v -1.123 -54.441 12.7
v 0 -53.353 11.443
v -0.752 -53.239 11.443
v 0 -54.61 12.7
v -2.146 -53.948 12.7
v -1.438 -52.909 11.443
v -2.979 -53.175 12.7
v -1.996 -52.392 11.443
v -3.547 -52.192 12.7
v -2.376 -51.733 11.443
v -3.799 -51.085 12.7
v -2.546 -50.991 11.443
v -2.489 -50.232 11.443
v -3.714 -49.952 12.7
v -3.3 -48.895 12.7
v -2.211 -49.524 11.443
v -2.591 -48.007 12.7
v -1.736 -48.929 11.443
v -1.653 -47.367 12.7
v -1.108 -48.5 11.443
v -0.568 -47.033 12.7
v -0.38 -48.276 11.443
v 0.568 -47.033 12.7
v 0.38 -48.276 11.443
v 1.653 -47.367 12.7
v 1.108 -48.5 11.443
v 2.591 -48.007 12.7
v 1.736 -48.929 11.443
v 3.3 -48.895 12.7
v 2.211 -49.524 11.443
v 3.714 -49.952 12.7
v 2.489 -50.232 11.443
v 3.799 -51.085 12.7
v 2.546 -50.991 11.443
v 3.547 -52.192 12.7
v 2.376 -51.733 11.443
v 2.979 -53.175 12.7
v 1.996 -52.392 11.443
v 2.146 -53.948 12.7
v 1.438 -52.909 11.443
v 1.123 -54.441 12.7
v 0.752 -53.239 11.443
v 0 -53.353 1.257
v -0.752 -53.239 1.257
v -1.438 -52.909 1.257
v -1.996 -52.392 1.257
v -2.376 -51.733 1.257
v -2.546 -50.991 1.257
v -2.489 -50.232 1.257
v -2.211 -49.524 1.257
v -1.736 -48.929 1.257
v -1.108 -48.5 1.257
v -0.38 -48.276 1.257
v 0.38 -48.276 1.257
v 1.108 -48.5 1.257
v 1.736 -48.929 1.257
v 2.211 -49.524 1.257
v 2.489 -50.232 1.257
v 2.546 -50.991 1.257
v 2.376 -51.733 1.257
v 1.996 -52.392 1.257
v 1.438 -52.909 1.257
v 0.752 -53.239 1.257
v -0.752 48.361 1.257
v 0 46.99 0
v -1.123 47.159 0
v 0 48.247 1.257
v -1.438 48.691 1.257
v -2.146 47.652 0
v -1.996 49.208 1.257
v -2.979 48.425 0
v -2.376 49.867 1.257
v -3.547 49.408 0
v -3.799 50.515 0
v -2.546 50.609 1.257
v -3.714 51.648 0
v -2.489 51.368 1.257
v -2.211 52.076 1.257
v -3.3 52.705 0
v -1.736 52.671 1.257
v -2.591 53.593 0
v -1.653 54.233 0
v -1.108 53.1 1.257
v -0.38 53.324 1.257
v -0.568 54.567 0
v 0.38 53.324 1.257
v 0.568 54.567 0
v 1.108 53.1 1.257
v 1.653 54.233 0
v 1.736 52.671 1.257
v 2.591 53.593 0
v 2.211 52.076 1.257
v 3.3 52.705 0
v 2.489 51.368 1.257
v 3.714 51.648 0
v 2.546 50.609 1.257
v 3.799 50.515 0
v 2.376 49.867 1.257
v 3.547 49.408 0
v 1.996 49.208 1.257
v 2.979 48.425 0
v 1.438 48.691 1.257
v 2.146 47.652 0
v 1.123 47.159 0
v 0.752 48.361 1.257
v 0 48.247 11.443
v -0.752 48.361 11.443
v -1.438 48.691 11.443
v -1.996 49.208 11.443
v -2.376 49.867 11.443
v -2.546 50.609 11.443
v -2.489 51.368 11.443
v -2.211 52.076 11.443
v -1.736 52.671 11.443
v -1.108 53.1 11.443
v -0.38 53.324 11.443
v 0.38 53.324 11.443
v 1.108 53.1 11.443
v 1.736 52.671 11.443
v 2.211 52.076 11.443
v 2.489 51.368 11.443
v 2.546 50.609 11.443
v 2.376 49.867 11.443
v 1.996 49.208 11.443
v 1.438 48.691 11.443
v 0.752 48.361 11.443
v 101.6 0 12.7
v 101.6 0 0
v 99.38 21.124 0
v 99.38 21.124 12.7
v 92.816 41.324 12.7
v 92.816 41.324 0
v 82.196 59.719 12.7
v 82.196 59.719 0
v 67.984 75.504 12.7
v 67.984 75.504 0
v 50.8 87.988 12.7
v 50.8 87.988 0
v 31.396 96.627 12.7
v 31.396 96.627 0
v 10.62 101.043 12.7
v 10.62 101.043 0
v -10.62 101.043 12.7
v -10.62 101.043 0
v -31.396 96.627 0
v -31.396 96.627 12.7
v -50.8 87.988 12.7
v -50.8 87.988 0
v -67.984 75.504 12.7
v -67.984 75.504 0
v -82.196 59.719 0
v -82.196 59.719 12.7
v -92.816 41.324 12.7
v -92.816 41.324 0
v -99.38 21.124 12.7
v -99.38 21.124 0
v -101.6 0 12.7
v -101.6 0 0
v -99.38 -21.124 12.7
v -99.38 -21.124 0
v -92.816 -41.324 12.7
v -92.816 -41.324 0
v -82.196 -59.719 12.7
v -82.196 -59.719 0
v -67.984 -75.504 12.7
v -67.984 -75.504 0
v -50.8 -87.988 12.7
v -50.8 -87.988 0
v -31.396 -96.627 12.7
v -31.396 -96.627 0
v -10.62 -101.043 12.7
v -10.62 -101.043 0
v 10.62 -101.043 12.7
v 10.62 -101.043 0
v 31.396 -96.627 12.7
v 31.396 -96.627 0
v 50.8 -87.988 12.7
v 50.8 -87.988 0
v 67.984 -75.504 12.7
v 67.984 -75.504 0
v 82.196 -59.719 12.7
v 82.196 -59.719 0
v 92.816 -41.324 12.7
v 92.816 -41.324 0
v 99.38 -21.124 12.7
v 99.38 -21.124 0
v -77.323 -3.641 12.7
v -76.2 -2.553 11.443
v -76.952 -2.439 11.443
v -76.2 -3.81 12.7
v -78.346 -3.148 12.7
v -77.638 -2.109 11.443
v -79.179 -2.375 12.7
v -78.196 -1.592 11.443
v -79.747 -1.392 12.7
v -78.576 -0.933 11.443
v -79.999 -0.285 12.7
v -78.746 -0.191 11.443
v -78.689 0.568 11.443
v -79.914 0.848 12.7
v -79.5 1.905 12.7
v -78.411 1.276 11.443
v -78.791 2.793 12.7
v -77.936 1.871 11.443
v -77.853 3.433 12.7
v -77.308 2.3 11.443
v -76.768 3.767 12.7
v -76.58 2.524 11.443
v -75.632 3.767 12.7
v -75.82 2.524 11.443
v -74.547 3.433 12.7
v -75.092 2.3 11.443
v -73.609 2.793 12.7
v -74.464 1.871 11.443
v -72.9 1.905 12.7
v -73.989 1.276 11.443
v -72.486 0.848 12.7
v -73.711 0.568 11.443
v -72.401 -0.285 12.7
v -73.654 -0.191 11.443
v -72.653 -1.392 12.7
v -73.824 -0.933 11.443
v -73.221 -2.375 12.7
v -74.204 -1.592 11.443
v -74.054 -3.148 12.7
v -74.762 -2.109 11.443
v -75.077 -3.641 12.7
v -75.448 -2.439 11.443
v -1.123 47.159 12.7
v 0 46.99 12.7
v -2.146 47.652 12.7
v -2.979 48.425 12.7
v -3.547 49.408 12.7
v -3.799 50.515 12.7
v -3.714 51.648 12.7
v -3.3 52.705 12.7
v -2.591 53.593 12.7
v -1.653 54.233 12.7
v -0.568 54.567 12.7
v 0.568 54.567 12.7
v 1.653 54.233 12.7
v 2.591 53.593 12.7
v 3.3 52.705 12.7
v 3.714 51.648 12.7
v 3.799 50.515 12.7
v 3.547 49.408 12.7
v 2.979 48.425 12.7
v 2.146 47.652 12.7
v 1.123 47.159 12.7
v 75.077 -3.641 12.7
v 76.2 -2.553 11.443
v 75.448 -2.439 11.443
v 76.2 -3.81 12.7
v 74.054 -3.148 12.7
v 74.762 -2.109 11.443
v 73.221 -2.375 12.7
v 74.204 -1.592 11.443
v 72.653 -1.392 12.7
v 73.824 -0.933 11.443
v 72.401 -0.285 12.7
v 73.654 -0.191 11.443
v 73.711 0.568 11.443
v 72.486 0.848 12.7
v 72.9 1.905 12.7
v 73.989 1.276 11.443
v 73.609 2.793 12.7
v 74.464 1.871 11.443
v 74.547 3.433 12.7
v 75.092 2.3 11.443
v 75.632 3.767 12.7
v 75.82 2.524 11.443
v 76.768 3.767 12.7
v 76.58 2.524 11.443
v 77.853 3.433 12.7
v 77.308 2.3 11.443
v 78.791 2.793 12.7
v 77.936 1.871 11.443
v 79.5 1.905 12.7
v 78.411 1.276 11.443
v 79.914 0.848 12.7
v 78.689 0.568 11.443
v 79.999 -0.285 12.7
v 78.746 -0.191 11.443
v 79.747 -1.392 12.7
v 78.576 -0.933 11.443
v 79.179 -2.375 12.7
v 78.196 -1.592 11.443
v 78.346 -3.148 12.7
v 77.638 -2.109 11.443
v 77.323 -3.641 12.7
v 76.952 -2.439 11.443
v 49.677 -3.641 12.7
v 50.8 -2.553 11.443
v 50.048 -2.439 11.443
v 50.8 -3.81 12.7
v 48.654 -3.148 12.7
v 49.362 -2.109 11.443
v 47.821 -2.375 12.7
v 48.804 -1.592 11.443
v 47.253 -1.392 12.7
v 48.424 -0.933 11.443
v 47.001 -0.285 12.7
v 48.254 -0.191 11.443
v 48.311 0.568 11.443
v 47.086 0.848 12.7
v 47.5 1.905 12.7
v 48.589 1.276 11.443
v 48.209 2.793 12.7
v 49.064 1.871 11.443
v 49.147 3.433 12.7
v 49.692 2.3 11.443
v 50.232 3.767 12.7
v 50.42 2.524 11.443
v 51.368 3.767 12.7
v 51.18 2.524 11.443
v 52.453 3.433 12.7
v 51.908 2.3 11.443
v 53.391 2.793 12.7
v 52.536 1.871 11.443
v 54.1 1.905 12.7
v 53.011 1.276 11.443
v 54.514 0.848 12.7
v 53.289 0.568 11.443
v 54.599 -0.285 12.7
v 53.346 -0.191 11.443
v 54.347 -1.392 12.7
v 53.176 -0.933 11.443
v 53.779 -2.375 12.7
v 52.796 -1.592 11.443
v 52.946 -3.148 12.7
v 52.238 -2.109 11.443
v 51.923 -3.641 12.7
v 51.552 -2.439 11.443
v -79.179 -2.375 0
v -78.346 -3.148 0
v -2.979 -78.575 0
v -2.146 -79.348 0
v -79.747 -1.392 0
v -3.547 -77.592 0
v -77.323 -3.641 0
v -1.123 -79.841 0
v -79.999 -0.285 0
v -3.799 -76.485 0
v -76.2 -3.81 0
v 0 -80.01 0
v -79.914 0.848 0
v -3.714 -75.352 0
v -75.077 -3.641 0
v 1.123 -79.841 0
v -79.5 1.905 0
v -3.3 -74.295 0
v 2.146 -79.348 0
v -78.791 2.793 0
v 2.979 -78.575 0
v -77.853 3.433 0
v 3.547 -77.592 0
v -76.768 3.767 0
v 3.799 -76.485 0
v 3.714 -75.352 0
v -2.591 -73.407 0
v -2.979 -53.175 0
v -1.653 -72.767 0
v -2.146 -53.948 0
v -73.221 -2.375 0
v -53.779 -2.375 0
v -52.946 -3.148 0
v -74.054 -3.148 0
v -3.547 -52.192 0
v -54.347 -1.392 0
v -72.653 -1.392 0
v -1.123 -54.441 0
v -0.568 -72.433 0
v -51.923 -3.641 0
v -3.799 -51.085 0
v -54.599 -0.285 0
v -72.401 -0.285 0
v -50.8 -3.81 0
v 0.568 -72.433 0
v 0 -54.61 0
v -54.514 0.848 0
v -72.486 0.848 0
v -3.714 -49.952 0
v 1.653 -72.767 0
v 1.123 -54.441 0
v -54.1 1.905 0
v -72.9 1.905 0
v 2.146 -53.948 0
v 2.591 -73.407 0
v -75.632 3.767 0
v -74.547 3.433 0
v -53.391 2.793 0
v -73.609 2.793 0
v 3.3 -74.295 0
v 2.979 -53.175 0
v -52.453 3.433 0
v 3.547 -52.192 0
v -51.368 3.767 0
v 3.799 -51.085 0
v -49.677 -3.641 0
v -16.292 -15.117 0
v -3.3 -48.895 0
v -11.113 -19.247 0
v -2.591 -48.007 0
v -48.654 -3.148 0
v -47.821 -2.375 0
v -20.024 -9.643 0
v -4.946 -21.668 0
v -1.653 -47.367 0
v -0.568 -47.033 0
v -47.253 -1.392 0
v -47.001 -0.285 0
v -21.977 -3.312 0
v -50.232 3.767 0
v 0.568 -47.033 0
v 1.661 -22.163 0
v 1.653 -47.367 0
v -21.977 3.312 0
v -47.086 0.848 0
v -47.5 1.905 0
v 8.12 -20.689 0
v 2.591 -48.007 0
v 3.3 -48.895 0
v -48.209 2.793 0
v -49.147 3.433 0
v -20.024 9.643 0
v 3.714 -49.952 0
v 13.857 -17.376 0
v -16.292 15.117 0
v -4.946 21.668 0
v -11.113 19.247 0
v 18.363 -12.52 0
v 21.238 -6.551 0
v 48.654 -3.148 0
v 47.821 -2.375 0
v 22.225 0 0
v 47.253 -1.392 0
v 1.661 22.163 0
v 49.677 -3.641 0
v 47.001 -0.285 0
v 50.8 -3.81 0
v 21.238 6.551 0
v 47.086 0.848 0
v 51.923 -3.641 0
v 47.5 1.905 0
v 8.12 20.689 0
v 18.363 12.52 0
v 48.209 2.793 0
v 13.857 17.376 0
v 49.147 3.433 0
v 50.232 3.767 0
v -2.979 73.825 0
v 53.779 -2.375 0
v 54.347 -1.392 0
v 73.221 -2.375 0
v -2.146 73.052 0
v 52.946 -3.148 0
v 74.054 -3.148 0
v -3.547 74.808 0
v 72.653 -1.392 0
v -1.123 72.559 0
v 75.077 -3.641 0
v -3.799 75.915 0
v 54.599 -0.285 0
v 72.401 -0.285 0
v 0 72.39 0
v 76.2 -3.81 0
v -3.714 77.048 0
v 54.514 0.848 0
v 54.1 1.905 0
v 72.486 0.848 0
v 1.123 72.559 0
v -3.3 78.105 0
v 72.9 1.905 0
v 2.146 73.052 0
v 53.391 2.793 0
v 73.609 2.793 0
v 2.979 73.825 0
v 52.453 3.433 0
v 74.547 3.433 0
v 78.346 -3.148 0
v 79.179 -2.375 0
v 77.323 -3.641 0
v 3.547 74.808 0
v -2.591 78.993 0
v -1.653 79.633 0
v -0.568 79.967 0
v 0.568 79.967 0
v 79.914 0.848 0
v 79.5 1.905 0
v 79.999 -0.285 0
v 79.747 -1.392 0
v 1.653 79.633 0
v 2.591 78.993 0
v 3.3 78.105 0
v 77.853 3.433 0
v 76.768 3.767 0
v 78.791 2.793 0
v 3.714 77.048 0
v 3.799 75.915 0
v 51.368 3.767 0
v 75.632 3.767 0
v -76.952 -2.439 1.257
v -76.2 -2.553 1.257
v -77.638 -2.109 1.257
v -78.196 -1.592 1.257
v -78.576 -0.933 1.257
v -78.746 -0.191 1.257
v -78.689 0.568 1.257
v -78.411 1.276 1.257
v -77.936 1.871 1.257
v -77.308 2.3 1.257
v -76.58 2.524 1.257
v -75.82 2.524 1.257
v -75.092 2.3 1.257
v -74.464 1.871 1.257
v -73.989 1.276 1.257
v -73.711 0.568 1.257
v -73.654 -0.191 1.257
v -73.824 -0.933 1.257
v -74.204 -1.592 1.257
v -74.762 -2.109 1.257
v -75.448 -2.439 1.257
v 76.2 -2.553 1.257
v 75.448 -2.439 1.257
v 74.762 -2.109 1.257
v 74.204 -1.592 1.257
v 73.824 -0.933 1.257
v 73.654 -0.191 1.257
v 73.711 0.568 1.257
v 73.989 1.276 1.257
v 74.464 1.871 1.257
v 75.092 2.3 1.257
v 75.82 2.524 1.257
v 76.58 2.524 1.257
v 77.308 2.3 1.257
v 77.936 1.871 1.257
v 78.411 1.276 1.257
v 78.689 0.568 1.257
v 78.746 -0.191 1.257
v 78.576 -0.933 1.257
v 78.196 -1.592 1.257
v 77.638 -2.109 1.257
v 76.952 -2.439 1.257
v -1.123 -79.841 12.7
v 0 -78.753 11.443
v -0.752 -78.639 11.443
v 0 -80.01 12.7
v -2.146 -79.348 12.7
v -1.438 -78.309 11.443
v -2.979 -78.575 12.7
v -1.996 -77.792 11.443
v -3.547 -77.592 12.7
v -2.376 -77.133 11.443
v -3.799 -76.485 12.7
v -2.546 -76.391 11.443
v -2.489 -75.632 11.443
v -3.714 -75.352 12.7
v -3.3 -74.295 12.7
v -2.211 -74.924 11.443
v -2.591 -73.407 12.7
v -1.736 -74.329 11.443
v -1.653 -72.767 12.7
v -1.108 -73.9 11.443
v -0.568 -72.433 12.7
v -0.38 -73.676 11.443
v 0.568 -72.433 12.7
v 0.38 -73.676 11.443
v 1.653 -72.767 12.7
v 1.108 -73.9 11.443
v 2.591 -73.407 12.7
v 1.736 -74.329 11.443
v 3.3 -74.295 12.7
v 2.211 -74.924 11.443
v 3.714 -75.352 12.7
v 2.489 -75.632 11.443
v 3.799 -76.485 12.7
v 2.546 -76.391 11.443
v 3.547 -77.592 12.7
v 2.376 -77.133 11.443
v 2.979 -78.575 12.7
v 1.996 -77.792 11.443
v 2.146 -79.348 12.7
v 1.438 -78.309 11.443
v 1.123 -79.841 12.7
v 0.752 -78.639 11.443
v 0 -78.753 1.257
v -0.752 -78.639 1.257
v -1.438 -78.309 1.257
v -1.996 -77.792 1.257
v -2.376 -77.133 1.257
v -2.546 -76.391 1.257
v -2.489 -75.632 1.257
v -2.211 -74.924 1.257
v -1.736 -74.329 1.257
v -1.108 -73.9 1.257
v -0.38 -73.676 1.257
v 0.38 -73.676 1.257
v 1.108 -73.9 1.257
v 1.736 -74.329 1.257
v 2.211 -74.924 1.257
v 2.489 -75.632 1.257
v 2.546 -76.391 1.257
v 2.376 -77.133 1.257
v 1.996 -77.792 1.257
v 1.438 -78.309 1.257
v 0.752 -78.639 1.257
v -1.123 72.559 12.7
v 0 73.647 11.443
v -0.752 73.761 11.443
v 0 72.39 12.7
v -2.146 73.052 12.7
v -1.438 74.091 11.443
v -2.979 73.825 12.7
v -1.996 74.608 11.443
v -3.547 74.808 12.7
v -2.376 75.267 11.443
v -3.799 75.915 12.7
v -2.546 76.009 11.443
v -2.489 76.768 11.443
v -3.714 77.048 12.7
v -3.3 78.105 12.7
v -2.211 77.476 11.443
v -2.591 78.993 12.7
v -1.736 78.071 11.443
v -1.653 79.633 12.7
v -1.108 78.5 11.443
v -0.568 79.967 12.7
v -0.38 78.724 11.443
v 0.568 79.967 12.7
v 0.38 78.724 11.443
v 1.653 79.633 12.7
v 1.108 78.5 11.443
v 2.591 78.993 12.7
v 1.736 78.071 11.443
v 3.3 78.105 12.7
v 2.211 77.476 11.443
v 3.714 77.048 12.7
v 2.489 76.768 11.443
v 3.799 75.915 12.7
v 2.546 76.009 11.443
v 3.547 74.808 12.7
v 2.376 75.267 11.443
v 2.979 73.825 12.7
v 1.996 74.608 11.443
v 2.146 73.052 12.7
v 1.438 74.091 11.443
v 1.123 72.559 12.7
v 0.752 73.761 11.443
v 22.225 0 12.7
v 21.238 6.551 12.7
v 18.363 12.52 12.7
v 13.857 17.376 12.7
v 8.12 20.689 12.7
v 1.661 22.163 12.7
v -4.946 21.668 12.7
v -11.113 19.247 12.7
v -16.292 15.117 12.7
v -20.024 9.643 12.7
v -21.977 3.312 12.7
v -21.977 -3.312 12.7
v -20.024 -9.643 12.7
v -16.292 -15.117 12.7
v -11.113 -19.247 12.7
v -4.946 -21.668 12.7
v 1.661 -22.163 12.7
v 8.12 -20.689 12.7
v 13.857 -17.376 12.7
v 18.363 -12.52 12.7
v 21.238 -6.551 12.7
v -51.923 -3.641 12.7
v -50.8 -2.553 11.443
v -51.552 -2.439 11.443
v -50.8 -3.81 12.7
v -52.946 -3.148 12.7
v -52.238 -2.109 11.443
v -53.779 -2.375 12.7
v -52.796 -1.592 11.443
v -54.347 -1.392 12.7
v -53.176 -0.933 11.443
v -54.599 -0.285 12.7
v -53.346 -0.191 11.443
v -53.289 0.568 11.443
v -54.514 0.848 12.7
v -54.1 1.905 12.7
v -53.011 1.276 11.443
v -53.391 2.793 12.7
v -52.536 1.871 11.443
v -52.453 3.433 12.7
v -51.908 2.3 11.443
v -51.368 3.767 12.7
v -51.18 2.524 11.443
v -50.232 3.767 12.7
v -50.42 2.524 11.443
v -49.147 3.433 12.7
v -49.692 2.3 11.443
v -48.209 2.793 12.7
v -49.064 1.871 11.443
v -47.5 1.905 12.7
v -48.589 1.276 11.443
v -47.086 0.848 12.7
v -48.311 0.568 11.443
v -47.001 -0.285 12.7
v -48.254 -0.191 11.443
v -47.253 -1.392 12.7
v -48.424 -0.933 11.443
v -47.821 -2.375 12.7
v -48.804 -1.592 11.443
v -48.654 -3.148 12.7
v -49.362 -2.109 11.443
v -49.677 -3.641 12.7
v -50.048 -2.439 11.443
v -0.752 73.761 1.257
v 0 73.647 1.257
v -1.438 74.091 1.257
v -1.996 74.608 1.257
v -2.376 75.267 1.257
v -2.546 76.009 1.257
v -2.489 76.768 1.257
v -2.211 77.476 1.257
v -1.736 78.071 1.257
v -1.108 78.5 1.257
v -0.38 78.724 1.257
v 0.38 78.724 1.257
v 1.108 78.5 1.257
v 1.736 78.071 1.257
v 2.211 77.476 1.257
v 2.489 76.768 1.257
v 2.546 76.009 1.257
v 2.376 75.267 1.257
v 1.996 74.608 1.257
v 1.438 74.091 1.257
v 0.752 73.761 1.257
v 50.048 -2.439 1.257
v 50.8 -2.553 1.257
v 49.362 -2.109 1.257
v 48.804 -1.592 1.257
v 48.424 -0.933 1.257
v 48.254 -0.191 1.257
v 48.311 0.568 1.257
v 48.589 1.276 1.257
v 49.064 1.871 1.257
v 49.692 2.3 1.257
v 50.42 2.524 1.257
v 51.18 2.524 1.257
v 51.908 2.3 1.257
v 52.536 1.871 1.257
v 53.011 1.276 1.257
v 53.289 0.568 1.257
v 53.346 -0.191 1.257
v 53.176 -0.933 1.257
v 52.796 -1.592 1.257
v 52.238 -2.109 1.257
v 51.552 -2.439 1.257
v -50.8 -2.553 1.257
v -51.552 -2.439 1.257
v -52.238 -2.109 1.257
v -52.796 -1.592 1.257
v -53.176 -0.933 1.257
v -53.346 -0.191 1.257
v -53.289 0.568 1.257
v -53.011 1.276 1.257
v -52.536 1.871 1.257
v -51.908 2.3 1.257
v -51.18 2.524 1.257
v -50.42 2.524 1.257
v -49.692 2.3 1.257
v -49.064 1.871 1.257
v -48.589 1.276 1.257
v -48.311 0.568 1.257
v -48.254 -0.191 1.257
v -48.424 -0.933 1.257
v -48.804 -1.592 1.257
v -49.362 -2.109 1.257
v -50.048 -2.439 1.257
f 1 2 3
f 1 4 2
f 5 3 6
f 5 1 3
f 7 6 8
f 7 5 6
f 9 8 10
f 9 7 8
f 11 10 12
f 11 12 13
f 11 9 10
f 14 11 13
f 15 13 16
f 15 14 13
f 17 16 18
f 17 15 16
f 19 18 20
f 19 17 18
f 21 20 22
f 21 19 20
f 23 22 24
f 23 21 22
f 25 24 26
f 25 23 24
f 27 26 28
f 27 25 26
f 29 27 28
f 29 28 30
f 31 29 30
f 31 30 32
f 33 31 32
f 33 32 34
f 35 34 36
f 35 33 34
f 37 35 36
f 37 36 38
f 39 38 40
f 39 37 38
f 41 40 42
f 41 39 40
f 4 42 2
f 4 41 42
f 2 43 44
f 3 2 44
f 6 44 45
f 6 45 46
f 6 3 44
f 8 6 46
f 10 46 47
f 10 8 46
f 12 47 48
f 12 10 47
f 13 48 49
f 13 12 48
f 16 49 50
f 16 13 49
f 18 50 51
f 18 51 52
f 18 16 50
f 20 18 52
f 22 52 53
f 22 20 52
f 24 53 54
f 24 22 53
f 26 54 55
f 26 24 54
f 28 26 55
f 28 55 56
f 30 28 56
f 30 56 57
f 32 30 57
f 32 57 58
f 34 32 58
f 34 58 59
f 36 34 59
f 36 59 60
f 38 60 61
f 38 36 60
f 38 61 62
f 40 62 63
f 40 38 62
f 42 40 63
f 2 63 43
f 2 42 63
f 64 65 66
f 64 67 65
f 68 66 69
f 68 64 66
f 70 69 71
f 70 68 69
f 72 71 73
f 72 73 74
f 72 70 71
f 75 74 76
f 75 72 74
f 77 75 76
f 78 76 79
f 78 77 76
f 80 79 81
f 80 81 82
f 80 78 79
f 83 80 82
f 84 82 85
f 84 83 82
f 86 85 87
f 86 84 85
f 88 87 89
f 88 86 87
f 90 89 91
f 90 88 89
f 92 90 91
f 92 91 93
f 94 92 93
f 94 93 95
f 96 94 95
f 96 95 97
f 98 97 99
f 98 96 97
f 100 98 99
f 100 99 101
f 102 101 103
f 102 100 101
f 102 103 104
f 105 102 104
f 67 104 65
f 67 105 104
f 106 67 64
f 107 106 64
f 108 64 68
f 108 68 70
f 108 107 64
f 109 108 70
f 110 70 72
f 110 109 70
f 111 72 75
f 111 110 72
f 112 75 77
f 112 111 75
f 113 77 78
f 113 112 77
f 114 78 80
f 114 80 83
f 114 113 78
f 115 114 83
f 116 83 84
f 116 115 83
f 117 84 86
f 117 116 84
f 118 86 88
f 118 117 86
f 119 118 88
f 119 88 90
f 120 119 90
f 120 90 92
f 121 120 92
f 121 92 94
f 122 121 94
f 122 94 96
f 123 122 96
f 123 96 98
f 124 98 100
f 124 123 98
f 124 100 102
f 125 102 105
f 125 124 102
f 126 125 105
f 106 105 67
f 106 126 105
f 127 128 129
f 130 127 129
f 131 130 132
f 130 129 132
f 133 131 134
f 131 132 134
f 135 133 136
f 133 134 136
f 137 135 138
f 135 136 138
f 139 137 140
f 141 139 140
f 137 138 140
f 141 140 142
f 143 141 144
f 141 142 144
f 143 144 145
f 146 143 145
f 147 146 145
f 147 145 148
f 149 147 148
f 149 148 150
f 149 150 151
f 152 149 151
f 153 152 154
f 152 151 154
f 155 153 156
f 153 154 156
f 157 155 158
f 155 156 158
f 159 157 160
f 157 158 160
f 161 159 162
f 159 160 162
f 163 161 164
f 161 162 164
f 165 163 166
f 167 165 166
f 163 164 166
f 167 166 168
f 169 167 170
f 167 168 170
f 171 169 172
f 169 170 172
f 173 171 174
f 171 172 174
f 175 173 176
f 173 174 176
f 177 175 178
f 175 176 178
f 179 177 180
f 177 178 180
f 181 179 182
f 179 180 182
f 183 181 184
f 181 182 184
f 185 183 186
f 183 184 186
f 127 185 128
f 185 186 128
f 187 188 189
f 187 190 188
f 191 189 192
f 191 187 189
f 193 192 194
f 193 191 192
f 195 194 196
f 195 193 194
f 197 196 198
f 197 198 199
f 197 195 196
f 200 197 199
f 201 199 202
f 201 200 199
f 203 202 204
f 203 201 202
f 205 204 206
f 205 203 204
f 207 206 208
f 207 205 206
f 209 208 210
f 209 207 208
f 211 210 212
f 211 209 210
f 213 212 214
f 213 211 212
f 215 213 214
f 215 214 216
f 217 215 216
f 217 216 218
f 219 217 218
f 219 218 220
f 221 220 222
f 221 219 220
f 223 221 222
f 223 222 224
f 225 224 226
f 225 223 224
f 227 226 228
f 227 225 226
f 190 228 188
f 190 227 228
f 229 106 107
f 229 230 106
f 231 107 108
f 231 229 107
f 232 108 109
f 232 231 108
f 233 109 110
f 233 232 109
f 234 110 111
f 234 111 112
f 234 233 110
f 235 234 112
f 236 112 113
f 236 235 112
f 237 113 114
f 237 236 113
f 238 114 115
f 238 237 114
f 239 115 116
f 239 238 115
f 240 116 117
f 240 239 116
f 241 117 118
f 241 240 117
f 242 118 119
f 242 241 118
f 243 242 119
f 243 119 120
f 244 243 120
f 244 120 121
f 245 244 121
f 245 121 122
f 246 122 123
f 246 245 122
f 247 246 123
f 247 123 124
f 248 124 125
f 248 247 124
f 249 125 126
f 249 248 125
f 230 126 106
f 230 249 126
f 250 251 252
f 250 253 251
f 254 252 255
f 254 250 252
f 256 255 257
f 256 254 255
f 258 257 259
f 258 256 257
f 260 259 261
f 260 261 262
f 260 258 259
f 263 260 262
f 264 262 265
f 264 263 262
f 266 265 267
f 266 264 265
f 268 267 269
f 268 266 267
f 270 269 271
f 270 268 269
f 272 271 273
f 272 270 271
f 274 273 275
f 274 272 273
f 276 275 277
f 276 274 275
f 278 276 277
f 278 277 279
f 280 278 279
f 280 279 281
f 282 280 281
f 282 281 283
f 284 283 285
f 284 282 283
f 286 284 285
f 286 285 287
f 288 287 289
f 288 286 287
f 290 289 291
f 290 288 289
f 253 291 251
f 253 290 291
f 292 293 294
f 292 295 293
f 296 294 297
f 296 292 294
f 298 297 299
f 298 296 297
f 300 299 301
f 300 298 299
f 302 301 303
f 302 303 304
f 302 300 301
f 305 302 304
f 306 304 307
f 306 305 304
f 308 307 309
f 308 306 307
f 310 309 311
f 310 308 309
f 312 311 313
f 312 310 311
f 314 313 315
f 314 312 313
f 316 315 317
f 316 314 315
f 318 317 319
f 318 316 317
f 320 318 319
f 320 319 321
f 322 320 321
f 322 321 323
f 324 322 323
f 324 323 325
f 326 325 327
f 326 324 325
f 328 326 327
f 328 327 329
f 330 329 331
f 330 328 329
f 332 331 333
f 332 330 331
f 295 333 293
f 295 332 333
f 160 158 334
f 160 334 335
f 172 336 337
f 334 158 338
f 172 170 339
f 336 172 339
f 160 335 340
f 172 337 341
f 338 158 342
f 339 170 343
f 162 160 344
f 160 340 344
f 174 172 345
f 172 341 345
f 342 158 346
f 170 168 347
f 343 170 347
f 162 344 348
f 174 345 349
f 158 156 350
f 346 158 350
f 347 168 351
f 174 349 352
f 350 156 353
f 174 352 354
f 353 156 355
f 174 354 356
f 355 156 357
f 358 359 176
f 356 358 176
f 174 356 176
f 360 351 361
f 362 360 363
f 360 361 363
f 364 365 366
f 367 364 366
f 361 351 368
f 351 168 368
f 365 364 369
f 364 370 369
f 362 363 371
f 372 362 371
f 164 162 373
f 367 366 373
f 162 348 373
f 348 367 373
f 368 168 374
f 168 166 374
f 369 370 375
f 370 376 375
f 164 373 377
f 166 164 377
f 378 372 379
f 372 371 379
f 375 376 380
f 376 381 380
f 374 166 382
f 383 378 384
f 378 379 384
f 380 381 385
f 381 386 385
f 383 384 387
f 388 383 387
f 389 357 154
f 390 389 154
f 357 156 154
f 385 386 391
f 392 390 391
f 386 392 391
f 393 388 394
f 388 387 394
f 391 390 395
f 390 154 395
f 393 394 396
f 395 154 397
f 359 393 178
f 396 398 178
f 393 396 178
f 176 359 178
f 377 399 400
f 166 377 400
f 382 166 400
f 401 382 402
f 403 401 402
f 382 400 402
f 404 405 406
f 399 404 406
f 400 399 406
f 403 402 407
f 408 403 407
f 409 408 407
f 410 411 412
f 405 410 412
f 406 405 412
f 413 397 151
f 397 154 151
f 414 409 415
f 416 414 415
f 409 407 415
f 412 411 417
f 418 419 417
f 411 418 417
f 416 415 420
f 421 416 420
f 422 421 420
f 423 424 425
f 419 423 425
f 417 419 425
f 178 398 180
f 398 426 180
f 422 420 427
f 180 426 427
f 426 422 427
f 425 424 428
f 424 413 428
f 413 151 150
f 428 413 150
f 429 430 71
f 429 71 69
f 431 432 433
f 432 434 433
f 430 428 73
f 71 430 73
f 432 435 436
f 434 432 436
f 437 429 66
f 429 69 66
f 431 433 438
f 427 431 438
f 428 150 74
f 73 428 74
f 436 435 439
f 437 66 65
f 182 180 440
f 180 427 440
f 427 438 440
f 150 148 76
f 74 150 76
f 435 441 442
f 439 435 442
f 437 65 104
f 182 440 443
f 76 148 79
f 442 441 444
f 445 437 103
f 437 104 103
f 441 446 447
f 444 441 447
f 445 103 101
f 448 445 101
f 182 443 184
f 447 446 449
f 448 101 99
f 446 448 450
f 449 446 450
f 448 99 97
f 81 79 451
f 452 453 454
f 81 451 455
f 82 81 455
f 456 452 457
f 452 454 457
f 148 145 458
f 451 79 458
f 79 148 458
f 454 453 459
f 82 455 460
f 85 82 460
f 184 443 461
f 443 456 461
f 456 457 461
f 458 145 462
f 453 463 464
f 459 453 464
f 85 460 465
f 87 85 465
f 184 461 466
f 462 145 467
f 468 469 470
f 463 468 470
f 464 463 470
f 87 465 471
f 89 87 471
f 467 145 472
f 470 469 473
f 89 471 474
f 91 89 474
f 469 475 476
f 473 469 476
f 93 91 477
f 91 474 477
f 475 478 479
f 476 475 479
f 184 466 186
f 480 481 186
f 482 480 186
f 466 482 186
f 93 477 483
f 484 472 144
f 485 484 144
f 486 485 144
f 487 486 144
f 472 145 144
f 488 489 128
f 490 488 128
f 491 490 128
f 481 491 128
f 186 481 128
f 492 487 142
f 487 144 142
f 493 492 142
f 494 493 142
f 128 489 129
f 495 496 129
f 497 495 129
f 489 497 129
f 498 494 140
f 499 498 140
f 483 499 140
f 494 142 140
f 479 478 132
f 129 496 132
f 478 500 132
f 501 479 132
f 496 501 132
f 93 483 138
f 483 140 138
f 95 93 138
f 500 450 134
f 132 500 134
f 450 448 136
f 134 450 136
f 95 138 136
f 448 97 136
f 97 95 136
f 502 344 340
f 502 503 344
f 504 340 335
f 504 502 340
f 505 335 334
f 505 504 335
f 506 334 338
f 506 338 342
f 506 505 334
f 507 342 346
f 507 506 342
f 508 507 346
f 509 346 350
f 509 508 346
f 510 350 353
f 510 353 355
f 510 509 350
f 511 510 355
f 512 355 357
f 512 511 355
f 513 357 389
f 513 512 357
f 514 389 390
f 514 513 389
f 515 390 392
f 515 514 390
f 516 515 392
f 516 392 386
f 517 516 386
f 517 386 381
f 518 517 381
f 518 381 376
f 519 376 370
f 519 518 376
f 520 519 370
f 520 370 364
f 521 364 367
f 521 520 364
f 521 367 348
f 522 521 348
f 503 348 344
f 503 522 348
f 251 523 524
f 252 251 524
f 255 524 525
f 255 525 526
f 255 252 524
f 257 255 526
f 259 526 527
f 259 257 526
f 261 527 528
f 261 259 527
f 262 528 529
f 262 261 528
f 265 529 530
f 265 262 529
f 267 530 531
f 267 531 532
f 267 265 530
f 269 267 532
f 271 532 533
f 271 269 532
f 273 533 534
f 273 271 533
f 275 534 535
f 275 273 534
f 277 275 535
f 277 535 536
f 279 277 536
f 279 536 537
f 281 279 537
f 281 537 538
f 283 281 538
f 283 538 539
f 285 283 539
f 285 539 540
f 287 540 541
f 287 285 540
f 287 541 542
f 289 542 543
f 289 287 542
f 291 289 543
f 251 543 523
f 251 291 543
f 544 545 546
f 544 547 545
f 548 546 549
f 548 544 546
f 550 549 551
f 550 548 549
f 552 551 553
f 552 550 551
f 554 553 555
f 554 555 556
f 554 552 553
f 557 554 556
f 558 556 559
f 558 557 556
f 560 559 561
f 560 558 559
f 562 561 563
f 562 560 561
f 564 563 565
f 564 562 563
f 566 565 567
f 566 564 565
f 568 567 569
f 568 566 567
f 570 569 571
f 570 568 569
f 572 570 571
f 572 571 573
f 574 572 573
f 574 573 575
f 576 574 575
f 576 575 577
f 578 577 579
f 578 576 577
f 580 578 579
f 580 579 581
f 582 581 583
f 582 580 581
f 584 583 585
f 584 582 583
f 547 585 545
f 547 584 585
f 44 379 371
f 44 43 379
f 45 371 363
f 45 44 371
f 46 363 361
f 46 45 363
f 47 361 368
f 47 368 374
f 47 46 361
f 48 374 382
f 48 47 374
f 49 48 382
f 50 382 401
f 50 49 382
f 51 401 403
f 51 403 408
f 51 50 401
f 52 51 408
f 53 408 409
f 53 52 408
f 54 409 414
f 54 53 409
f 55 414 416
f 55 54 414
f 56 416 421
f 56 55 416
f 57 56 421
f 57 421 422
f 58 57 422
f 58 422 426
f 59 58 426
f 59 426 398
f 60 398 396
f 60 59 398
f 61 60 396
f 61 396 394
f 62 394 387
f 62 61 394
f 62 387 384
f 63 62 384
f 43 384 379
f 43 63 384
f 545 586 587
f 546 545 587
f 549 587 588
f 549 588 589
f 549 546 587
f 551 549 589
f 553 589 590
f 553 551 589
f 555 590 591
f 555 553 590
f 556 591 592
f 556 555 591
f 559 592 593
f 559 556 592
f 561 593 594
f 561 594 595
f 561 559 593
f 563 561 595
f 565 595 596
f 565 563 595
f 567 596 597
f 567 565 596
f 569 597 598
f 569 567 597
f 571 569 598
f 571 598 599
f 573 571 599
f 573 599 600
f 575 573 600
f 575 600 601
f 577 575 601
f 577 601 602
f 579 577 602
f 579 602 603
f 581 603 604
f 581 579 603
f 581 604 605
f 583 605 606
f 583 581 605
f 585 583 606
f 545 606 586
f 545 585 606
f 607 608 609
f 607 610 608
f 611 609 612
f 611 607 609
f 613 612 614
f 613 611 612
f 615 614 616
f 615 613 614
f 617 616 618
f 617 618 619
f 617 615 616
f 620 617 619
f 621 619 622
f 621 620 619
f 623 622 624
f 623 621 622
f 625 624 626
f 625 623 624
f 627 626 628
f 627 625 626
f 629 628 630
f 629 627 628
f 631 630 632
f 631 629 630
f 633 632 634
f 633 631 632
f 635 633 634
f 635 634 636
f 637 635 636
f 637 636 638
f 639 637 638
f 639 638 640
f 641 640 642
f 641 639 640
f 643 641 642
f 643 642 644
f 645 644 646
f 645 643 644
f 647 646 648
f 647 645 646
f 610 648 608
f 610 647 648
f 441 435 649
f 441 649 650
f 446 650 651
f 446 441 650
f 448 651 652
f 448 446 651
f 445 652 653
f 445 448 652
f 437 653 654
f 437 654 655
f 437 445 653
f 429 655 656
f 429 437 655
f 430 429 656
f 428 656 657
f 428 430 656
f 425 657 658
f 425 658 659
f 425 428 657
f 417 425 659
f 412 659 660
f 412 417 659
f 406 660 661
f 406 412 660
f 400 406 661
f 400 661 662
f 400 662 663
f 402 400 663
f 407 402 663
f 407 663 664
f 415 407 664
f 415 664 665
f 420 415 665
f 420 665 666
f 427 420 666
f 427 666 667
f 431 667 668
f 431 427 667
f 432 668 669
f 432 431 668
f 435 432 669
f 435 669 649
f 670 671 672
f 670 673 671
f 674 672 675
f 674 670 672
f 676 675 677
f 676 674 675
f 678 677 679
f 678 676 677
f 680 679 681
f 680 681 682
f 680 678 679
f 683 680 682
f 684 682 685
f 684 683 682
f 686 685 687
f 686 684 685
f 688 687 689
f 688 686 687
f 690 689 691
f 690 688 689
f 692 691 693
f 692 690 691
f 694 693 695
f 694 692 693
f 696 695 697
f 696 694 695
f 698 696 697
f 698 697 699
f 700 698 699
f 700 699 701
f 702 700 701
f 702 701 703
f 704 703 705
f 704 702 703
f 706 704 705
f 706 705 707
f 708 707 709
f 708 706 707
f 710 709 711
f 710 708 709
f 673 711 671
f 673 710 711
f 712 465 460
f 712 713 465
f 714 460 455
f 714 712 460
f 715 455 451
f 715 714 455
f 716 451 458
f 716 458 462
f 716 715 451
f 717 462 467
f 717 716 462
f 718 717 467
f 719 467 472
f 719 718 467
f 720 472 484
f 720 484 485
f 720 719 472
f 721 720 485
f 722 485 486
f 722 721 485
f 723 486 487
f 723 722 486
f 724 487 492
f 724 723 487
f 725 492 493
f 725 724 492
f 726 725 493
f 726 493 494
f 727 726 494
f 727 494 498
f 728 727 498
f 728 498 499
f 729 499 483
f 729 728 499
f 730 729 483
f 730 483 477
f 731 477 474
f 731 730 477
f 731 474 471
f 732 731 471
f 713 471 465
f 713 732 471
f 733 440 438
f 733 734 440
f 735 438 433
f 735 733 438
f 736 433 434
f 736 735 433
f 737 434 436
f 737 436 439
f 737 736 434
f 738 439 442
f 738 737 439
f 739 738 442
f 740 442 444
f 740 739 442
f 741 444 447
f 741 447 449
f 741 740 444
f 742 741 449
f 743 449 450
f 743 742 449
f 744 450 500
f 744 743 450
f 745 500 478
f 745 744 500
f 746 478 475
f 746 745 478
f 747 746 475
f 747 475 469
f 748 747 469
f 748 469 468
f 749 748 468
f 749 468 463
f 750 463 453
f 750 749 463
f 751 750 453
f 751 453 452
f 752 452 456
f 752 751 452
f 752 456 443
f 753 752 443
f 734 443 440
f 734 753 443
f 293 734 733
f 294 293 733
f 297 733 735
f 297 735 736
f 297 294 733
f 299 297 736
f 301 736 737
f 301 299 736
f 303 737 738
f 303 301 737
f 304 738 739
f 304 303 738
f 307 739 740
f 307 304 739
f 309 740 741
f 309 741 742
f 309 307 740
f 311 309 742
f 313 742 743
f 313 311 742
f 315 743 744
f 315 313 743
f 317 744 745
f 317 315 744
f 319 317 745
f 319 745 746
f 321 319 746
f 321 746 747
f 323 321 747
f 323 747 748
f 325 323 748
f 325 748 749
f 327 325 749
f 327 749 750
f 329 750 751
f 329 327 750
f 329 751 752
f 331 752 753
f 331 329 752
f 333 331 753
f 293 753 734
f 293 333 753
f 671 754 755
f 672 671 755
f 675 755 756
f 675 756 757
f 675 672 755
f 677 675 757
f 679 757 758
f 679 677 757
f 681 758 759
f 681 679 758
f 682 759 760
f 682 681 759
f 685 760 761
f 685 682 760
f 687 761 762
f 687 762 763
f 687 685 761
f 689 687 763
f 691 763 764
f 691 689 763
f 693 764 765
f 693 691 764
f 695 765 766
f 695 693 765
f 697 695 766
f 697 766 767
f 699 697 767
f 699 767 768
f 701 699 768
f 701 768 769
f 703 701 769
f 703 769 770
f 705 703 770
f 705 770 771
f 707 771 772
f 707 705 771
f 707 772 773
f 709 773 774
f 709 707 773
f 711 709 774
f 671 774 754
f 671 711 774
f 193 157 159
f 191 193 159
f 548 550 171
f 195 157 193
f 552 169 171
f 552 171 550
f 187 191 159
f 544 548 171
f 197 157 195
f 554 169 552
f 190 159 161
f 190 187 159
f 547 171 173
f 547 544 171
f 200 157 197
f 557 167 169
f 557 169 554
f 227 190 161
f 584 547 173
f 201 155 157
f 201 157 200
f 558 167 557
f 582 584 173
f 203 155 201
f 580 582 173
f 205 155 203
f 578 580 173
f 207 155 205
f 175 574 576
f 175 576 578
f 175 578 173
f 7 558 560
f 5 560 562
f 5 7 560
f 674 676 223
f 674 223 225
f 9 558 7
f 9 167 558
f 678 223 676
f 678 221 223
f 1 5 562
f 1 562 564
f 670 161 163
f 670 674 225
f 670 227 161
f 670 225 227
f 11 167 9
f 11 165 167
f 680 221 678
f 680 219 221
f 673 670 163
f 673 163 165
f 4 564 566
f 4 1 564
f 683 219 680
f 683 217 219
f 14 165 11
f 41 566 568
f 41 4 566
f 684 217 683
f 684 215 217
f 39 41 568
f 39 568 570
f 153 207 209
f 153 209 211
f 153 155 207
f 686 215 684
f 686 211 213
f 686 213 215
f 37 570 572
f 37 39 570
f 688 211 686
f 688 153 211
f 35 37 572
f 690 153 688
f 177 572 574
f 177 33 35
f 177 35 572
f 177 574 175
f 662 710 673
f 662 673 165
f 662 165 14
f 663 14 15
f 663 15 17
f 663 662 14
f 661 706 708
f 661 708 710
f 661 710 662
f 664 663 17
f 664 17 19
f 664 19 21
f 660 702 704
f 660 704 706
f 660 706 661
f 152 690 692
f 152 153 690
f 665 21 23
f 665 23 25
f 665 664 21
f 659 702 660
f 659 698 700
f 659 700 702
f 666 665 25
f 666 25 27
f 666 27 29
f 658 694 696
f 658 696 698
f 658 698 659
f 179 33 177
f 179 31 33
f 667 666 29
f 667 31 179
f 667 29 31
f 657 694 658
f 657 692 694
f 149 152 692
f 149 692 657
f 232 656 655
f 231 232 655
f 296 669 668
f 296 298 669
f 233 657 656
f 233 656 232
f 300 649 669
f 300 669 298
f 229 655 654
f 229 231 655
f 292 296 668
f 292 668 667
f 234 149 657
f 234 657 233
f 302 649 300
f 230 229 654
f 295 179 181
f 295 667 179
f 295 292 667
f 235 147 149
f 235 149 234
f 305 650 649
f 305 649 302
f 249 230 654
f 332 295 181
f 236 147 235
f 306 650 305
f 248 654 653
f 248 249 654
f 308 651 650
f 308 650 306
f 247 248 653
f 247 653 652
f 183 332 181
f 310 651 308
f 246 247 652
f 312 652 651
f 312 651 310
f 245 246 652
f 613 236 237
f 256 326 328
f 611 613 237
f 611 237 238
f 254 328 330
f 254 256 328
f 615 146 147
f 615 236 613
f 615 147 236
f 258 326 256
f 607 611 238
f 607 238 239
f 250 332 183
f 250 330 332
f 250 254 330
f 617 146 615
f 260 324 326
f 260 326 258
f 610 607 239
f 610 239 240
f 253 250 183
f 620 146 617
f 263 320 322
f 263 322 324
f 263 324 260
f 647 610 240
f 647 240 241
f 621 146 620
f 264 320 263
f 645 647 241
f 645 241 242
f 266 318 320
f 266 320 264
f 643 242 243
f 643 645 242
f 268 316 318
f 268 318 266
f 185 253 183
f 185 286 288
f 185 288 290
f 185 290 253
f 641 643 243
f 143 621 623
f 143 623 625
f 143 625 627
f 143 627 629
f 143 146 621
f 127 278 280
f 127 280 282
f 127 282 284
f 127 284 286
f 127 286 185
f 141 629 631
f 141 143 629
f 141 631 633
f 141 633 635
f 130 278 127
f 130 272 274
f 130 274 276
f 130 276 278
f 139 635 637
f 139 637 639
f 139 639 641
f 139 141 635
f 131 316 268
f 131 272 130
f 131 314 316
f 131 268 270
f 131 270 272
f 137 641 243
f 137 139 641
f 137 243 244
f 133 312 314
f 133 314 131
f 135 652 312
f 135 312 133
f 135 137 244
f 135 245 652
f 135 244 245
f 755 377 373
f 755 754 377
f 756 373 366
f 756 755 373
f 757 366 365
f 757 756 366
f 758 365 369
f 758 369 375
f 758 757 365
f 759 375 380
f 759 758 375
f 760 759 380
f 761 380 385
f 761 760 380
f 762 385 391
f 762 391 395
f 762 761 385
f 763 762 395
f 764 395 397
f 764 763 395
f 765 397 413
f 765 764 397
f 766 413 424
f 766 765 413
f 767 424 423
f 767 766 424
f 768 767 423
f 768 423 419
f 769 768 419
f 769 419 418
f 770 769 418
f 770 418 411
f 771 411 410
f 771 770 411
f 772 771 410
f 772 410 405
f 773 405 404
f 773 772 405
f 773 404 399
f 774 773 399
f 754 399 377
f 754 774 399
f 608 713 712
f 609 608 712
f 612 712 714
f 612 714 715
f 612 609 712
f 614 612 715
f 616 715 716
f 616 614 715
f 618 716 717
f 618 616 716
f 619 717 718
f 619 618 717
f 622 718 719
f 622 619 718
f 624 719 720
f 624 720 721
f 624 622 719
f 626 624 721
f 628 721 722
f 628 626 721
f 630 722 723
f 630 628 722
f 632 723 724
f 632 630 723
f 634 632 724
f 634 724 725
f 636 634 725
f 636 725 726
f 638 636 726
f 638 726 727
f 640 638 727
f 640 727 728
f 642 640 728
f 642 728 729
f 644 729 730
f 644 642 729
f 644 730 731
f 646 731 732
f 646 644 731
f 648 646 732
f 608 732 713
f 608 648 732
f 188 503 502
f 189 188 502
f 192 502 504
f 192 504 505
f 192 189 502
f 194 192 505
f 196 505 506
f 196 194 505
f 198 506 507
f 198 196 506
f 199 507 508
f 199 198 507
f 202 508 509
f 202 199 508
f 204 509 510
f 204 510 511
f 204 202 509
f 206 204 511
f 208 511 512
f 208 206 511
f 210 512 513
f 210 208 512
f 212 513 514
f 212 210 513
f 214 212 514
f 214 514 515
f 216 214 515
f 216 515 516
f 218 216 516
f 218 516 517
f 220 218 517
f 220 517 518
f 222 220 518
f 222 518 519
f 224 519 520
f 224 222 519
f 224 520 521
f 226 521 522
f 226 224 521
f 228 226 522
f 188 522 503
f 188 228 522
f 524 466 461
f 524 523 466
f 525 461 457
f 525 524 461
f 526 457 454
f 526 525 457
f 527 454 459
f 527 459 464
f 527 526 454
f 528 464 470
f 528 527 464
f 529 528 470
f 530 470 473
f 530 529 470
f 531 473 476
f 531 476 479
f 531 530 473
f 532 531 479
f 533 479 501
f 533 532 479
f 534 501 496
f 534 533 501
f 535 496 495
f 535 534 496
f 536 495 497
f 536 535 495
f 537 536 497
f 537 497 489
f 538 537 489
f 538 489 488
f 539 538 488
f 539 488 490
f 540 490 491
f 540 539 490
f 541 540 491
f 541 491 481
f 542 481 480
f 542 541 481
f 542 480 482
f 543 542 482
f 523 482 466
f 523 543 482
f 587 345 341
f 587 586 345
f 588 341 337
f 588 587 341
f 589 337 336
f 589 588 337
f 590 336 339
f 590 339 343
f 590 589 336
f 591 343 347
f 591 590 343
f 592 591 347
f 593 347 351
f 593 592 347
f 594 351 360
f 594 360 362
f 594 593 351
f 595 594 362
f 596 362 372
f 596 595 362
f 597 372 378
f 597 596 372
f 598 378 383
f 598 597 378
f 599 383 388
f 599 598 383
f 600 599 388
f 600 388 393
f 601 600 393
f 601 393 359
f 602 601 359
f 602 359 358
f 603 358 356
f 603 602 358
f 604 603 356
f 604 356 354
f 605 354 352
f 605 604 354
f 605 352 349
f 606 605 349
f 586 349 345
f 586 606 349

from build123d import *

# Parameters (mm, degrees)
SKETCH1_R                        = 101.6
SKETCH1_R_2                      = 22.225
BOSS_EXTRUDE1_DEPTH              = 12.7
F_1_4_20_TAPPED_HOLE1_AT_2_COUNT = 2
F_1_4_20_TAPPED_HOLE1_AT_2_PITCH = 91.581002397
F_1_4_20_TAPPED_HOLE1_AT_3_COUNT = 2
F_1_4_20_TAPPED_HOLE1_AT_3_PITCH = 71.842048969
F_1_4_20_TAPPED_HOLE1_AT_4_COUNT = 2
F_1_4_20_TAPPED_HOLE1_AT_4_PITCH = 127
F_1_4_20_TAPPED_HOLE1_AT_5_COUNT = 2
F_1_4_20_TAPPED_HOLE1_AT_5_PITCH = 101.6
F_1_4_20_TAPPED_HOLE1_AT_6_COUNT = 2
F_1_4_20_TAPPED_HOLE1_AT_6_PITCH = 91.581002397
F_1_4_20_TAPPED_HOLE1_AT_7_COUNT = 2
F_1_4_20_TAPPED_HOLE1_AT_7_PITCH = 71.842048969
F_1_4_20_TAPPED_HOLE1_AT_8_COUNT = 2
F_1_4_20_TAPPED_HOLE1_AT_8_PITCH = 25.4


with BuildPart() as part:
    # Sketch1 → Boss-Extrude1 (new body)
    with BuildSketch(Plane.XY):
        Circle(SKETCH1_R)
        Circle(SKETCH1_R_2, mode=Mode.SUBTRACT)
    extrude(amount=BOSS_EXTRUDE1_DEPTH)

    # Sketch3 → 1/4-20 Tapped Hole1 (revolve, cut)
    with BuildSketch(Plane(origin=(-50.8, 0, 12.7), x_dir=(0, -1, 0), z_dir=(1, 0, 0))):
        Polygon((0, 0), (0, 12.7), (3.81, 12.7), (2.5527, 11.4427), (2.5527, 1.2573), (3.81, 0), align=None)
    f_1_4_20_tapped_hole1 = revolve(axis=Axis((-50.8, 0, 19.05), (0, 0, -1)), mode=Mode.SUBTRACT)

    # 1/4-20 Tapped Hole1 at 2: 1/4-20 Tapped Hole1 ×2
    with Locations(*[Vector(0.554700196, 0.832050294, 0) * (i * F_1_4_20_TAPPED_HOLE1_AT_2_PITCH) for i in range(1, F_1_4_20_TAPPED_HOLE1_AT_2_COUNT)]):
        add(f_1_4_20_tapped_hole1, mode=Mode.SUBTRACT)

    # 1/4-20 Tapped Hole1 at 3: 1/4-20 Tapped Hole1 ×2
    with Locations(*[Vector(0.707106781, 0.707106781, 0) * (i * F_1_4_20_TAPPED_HOLE1_AT_3_PITCH) for i in range(1, F_1_4_20_TAPPED_HOLE1_AT_3_COUNT)]):
        add(f_1_4_20_tapped_hole1, mode=Mode.SUBTRACT)

    # 1/4-20 Tapped Hole1 at 4: 1/4-20 Tapped Hole1 ×2
    with Locations(*[(i * F_1_4_20_TAPPED_HOLE1_AT_4_PITCH, 0, 0) for i in range(1, F_1_4_20_TAPPED_HOLE1_AT_4_COUNT)]):
        add(f_1_4_20_tapped_hole1, mode=Mode.SUBTRACT)

    # 1/4-20 Tapped Hole1 at 5: 1/4-20 Tapped Hole1 ×2
    with Locations(*[(i * F_1_4_20_TAPPED_HOLE1_AT_5_PITCH, 0, 0) for i in range(1, F_1_4_20_TAPPED_HOLE1_AT_5_COUNT)]):
        add(f_1_4_20_tapped_hole1, mode=Mode.SUBTRACT)

    # 1/4-20 Tapped Hole1 at 6: 1/4-20 Tapped Hole1 ×2
    with Locations(*[Vector(0.554700196, -0.832050294, 0) * (i * F_1_4_20_TAPPED_HOLE1_AT_6_PITCH) for i in range(1, F_1_4_20_TAPPED_HOLE1_AT_6_COUNT)]):
        add(f_1_4_20_tapped_hole1, mode=Mode.SUBTRACT)

    # 1/4-20 Tapped Hole1 at 7: 1/4-20 Tapped Hole1 ×2
    with Locations(*[Vector(0.707106781, -0.707106781, 0) * (i * F_1_4_20_TAPPED_HOLE1_AT_7_PITCH) for i in range(1, F_1_4_20_TAPPED_HOLE1_AT_7_COUNT)]):
        add(f_1_4_20_tapped_hole1, mode=Mode.SUBTRACT)

    # 1/4-20 Tapped Hole1 at 8: 1/4-20 Tapped Hole1 ×2
    with Locations(*[(-i * F_1_4_20_TAPPED_HOLE1_AT_8_PITCH, 0, 0) for i in range(1, F_1_4_20_TAPPED_HOLE1_AT_8_COUNT)]):
        add(f_1_4_20_tapped_hole1, mode=Mode.SUBTRACT)


solid = part.part
